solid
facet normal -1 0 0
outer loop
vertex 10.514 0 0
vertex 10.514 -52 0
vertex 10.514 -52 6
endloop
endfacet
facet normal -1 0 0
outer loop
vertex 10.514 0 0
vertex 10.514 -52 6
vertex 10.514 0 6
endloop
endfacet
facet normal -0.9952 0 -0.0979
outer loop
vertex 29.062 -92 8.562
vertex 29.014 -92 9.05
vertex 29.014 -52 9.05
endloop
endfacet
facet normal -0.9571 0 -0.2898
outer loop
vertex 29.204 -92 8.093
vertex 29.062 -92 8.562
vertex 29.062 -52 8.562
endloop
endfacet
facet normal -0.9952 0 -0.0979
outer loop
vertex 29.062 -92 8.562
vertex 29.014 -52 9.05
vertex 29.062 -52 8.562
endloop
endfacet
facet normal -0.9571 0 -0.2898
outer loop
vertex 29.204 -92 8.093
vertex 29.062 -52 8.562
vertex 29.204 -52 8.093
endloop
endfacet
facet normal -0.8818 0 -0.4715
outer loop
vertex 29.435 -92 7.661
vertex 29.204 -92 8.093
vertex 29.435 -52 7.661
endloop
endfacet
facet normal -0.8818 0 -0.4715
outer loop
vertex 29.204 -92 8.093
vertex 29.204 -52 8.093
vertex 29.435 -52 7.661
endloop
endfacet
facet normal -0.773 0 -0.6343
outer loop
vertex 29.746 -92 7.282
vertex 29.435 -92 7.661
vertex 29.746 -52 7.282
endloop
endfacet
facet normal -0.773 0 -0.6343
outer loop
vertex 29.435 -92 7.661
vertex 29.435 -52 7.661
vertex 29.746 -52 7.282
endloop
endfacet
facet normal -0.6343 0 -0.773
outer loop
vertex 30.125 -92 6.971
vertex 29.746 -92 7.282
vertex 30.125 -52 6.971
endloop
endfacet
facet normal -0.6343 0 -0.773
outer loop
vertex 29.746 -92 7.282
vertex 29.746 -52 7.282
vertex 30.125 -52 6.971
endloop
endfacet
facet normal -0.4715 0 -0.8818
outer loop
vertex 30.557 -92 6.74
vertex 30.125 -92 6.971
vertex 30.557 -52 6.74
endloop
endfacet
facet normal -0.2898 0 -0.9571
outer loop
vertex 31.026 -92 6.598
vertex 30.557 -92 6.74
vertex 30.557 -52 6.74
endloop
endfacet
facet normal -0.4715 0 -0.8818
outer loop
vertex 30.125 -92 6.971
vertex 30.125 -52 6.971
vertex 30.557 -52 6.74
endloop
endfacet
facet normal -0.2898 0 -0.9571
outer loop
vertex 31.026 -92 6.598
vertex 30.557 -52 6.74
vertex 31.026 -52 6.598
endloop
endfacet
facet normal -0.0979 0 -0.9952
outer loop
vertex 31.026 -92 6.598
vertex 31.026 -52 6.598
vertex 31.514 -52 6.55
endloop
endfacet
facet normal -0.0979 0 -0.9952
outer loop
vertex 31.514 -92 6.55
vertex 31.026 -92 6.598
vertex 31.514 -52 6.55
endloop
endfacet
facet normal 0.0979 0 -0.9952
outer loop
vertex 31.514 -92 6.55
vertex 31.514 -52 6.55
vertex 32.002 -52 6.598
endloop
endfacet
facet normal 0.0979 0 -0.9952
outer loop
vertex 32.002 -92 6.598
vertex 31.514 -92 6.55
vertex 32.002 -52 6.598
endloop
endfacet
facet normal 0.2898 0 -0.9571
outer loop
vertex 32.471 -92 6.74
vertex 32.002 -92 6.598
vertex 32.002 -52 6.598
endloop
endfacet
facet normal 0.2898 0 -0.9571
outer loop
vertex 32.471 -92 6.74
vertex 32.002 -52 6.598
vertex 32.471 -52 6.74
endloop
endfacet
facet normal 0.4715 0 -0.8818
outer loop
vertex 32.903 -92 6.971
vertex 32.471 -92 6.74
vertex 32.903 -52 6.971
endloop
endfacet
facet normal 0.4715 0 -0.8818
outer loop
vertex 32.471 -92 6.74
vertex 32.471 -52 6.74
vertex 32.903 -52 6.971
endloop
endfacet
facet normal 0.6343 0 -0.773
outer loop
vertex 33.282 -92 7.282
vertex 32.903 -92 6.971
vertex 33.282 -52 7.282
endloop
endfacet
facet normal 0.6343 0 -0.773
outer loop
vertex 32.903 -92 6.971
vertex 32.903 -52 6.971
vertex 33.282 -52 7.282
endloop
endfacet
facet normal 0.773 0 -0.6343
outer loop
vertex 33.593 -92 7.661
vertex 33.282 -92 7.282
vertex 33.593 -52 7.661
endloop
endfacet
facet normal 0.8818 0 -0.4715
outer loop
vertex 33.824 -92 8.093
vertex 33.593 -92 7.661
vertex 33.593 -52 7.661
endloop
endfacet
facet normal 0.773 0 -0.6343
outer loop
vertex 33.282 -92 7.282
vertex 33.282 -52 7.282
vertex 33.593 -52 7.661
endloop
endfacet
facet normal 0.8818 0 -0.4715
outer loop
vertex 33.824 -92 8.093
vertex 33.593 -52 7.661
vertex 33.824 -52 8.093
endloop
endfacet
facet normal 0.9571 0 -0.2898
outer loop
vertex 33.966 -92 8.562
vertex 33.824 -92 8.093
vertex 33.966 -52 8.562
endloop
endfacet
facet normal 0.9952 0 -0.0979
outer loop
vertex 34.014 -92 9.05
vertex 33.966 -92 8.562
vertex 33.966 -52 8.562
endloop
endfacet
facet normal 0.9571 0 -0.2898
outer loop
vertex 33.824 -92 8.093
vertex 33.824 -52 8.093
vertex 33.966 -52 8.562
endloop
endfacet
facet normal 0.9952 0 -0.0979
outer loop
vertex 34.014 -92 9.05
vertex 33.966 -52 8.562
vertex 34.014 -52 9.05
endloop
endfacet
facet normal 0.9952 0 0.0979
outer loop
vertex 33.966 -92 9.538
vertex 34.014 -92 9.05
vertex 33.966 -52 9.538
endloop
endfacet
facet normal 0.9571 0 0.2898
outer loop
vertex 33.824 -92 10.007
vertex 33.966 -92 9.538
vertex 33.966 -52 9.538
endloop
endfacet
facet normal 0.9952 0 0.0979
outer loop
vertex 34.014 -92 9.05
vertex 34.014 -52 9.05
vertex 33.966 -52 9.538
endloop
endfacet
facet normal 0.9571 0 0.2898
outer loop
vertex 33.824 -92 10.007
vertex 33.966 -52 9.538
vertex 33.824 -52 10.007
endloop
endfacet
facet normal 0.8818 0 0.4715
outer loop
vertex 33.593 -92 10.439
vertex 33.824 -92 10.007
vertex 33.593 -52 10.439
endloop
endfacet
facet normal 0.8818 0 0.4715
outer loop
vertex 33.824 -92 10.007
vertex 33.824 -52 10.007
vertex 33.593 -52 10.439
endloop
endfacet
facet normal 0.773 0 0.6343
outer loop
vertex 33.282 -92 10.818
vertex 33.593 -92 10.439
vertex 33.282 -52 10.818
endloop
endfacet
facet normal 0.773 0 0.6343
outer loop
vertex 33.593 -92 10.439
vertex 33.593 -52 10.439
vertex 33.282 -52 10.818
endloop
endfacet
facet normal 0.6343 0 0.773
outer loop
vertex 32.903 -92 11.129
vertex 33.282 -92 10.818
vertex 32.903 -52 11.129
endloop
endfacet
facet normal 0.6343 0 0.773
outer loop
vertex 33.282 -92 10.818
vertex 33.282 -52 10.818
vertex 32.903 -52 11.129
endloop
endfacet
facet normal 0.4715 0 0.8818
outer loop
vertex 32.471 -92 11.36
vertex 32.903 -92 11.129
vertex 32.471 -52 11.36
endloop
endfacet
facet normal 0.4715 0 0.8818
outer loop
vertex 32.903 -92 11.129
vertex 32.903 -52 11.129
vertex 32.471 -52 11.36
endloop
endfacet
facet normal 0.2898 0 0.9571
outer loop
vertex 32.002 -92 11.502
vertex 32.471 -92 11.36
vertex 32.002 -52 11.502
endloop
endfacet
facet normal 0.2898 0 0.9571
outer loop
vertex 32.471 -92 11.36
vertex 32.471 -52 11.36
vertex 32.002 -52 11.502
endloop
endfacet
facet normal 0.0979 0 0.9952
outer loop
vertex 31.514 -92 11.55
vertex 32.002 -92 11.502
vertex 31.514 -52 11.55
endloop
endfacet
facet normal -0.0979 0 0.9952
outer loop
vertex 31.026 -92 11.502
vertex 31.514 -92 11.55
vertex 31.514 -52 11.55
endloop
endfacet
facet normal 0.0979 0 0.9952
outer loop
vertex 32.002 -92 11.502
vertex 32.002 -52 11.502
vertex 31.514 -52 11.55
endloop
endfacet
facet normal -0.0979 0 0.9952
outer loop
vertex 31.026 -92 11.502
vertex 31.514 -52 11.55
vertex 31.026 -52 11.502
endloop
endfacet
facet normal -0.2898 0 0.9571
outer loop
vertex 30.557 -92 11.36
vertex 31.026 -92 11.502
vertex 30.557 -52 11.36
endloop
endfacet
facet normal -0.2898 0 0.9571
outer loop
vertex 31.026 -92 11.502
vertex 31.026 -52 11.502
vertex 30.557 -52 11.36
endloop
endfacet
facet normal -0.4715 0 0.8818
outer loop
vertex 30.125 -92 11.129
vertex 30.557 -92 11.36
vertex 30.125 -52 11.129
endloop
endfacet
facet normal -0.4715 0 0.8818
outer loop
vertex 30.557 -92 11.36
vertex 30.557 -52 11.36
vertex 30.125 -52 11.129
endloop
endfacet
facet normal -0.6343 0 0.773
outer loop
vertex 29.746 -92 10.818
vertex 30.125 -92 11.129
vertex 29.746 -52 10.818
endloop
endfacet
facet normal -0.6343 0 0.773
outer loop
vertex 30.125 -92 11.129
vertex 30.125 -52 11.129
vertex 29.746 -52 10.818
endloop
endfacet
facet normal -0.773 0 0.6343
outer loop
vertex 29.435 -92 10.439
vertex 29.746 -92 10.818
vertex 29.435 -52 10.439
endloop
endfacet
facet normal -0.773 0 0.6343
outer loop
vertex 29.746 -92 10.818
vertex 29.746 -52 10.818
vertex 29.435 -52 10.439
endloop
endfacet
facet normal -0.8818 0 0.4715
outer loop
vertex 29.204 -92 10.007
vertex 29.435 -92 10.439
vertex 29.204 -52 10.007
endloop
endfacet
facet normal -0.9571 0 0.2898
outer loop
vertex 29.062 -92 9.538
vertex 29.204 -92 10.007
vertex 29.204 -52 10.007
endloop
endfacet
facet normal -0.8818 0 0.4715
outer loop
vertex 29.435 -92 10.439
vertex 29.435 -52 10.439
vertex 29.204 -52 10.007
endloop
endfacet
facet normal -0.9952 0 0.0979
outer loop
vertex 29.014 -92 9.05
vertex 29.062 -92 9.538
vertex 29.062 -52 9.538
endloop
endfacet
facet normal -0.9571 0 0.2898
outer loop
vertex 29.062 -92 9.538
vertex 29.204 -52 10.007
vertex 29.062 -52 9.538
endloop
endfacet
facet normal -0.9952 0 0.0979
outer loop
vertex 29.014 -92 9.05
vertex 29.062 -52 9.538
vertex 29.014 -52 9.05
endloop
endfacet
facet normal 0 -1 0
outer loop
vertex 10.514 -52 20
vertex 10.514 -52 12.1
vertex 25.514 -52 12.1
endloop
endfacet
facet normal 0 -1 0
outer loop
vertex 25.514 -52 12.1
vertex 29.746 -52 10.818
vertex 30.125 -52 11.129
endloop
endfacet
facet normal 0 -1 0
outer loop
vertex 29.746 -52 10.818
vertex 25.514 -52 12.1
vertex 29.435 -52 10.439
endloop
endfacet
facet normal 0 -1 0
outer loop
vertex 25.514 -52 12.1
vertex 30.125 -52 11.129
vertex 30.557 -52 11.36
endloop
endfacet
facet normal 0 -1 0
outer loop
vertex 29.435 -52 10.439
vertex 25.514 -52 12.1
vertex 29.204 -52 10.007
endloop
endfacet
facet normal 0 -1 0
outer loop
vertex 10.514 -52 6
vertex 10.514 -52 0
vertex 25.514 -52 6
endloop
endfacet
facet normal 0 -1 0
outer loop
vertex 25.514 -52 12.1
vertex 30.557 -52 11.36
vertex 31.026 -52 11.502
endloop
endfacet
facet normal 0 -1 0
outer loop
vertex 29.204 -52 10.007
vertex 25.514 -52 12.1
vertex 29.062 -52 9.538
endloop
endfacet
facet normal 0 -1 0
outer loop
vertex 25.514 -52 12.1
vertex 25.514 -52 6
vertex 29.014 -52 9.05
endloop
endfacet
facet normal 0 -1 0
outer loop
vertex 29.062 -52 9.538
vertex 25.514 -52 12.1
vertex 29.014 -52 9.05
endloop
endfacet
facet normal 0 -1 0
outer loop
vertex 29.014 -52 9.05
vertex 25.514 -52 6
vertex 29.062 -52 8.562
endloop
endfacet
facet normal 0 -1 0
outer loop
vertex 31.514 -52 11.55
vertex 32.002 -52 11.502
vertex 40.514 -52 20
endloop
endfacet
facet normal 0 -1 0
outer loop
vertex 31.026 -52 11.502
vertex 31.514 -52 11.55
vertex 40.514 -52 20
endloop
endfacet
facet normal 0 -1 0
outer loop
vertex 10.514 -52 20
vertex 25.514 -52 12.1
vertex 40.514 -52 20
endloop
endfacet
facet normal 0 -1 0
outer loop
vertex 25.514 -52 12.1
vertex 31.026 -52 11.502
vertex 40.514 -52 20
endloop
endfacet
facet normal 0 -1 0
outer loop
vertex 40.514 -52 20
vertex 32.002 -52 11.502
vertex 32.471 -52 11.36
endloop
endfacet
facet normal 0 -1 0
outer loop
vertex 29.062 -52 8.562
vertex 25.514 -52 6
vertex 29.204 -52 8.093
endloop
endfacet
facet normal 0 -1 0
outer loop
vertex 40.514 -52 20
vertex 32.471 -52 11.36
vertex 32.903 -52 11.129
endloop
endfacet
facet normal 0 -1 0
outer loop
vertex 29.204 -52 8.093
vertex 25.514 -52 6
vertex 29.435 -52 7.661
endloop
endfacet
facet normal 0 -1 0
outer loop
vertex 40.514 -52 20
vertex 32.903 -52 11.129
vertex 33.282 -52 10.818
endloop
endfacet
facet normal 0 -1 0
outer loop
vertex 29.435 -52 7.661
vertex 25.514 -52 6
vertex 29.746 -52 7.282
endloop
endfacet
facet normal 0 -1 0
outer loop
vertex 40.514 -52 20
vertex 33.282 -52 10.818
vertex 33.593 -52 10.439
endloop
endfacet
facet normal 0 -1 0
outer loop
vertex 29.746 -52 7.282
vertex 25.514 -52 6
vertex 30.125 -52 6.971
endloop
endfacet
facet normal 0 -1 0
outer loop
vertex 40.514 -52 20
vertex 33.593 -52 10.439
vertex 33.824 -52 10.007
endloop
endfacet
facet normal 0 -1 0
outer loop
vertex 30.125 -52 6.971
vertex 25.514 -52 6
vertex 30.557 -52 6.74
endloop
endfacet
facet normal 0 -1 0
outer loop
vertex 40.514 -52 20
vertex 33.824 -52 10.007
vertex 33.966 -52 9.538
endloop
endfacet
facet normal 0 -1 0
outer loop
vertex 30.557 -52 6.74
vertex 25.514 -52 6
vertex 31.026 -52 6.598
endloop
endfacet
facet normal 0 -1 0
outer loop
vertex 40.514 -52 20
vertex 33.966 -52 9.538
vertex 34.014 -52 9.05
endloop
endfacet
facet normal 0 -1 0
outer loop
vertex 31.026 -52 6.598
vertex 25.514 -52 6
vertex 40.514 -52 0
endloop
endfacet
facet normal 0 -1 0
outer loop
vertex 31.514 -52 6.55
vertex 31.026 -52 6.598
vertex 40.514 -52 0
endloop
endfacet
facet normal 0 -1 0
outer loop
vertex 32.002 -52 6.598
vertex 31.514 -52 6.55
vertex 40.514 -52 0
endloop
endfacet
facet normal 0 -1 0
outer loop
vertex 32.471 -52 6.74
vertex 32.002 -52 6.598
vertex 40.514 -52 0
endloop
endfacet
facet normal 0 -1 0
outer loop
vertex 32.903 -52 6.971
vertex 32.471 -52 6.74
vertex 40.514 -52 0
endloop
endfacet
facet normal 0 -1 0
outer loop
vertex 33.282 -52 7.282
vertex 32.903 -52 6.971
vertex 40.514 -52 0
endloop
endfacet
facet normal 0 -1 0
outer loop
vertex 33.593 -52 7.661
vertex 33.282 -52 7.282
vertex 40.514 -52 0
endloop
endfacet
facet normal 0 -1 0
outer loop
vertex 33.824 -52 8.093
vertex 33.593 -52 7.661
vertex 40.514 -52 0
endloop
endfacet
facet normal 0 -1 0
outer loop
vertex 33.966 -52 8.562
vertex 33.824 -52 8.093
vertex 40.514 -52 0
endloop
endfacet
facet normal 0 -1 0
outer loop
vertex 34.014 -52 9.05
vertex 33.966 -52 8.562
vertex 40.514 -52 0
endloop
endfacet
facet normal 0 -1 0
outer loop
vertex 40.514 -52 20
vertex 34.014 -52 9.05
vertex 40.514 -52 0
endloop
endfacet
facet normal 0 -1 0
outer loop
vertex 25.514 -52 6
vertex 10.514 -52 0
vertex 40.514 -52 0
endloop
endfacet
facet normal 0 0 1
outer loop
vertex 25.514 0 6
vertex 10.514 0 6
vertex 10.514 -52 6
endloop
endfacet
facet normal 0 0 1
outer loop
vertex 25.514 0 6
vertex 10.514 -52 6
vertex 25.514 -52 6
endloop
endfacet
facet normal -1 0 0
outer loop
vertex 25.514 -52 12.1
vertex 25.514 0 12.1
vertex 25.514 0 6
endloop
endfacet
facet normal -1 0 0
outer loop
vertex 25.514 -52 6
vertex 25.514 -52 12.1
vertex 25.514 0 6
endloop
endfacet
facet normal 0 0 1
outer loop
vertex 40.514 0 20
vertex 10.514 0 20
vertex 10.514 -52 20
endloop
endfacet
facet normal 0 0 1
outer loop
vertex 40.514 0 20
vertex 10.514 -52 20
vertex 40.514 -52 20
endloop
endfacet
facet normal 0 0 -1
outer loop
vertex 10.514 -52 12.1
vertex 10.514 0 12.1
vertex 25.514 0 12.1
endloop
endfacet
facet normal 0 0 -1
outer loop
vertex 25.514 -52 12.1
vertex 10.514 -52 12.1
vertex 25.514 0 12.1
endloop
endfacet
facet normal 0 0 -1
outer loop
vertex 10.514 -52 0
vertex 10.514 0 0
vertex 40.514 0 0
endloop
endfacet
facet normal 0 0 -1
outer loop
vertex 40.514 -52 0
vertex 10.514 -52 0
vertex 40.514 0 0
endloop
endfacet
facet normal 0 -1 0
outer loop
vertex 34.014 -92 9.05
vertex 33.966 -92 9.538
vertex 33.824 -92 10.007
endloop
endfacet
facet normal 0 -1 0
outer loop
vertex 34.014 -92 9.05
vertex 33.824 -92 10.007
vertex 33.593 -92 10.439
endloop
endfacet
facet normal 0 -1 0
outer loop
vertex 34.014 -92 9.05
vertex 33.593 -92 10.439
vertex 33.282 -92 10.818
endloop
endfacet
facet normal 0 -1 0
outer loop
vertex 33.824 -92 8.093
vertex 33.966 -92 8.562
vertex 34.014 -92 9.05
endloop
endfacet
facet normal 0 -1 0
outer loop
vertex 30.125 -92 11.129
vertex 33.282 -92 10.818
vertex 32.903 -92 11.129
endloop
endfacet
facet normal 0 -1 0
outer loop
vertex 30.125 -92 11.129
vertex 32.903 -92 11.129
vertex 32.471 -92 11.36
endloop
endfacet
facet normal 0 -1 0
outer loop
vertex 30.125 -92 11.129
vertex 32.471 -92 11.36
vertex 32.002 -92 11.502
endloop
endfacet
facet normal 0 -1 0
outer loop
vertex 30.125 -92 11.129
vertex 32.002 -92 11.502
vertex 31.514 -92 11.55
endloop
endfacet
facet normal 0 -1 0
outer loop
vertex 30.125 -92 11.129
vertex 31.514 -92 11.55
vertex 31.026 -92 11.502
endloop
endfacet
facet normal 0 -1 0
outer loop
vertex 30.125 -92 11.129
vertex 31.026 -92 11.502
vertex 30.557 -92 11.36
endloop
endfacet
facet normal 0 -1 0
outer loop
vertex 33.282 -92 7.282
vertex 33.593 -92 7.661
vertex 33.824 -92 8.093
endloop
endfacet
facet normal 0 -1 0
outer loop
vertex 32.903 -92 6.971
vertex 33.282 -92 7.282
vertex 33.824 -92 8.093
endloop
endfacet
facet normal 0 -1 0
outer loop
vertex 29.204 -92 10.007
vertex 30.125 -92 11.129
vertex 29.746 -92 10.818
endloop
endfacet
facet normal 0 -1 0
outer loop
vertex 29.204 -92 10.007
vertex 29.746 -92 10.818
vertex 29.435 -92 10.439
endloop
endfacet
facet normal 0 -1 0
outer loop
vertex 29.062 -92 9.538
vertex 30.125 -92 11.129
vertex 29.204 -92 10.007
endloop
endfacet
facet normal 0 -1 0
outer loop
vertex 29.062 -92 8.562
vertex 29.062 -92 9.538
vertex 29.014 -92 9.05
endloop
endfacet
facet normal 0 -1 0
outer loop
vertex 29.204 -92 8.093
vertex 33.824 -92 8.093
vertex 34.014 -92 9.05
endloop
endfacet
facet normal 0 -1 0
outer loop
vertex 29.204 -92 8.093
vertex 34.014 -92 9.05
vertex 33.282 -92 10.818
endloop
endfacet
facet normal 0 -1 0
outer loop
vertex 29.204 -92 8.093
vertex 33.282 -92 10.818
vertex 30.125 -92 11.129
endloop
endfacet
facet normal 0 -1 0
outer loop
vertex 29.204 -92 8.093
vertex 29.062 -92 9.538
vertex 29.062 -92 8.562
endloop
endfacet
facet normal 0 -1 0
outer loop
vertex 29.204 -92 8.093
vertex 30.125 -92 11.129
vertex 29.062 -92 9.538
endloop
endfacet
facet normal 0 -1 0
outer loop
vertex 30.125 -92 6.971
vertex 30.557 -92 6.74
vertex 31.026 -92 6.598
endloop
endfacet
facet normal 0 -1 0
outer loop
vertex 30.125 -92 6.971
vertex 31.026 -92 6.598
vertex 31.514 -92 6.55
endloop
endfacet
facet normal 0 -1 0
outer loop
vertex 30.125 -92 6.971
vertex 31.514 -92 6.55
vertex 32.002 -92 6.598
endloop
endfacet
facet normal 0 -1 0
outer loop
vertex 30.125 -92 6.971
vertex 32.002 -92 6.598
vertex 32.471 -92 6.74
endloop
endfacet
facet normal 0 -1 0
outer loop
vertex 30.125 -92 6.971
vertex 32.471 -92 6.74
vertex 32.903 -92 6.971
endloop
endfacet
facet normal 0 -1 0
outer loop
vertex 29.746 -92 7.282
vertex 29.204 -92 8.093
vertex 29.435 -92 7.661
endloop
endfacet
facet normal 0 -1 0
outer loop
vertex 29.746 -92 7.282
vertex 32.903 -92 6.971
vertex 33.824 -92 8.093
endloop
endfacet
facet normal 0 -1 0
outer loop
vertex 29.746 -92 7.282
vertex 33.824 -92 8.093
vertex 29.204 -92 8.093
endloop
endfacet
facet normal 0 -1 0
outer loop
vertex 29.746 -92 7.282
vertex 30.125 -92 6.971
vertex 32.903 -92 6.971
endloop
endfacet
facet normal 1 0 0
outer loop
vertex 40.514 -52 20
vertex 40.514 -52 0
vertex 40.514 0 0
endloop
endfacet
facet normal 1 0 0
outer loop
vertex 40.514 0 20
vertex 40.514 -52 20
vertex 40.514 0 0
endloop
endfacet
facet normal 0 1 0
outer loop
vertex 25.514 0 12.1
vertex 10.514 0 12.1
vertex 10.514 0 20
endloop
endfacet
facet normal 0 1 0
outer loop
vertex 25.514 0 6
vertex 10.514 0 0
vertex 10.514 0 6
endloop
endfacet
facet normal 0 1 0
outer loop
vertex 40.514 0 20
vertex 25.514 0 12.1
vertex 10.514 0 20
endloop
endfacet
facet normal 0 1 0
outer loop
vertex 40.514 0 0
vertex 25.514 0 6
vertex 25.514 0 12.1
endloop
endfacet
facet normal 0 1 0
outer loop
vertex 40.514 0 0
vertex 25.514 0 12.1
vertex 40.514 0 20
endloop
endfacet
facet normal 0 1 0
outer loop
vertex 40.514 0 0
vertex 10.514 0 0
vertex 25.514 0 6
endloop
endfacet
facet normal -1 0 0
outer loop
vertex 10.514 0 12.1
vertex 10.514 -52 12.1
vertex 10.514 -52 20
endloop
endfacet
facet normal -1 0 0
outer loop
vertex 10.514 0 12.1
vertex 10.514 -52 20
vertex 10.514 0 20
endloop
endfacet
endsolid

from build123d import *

# Parameters (mm, degrees)
SKETCH1_W           = 30
SKETCH1_H           = 52
BOSS_EXTRUDE1_DEPTH = 20
SKETCH3_W           = 15
SKETCH3_H           = 6.1
CUT_EXTRUDE1_DEPTH  = 69.886771008
SKETCH4_R           = 2.5
BOSS_EXTRUDE2_DEPTH = 40


with BuildPart() as part:
    # Sketch1 → Boss-Extrude1 (new body)
    with BuildSketch(Plane.XY):
        with Locations((25.514037319, -26)):
            Rectangle(SKETCH1_W, SKETCH1_H)
    extrude(amount=BOSS_EXTRUDE1_DEPTH)

    # Sketch3 → Cut-Extrude1 (cut, through all)
    with BuildSketch(Plane(origin=(0, 0, 0), x_dir=(1, 0, 0), z_dir=(0, 1, 0))):
        with Locations((18.014037319, -9.05)):
            Rectangle(SKETCH3_W, SKETCH3_H)
    extrude(amount=-CUT_EXTRUDE1_DEPTH, mode=Mode.SUBTRACT)

    # Sketch4 → Boss-Extrude2 (add)
    with BuildSketch(Plane(origin=(0, -52, 0), x_dir=(-1, 0, 0), z_dir=(0, -1, 0))):
        with Locations((-31.514037319, -9.05)):
            Circle(SKETCH4_R)
    extrude(amount=BOSS_EXTRUDE2_DEPTH)


solid = part.part
